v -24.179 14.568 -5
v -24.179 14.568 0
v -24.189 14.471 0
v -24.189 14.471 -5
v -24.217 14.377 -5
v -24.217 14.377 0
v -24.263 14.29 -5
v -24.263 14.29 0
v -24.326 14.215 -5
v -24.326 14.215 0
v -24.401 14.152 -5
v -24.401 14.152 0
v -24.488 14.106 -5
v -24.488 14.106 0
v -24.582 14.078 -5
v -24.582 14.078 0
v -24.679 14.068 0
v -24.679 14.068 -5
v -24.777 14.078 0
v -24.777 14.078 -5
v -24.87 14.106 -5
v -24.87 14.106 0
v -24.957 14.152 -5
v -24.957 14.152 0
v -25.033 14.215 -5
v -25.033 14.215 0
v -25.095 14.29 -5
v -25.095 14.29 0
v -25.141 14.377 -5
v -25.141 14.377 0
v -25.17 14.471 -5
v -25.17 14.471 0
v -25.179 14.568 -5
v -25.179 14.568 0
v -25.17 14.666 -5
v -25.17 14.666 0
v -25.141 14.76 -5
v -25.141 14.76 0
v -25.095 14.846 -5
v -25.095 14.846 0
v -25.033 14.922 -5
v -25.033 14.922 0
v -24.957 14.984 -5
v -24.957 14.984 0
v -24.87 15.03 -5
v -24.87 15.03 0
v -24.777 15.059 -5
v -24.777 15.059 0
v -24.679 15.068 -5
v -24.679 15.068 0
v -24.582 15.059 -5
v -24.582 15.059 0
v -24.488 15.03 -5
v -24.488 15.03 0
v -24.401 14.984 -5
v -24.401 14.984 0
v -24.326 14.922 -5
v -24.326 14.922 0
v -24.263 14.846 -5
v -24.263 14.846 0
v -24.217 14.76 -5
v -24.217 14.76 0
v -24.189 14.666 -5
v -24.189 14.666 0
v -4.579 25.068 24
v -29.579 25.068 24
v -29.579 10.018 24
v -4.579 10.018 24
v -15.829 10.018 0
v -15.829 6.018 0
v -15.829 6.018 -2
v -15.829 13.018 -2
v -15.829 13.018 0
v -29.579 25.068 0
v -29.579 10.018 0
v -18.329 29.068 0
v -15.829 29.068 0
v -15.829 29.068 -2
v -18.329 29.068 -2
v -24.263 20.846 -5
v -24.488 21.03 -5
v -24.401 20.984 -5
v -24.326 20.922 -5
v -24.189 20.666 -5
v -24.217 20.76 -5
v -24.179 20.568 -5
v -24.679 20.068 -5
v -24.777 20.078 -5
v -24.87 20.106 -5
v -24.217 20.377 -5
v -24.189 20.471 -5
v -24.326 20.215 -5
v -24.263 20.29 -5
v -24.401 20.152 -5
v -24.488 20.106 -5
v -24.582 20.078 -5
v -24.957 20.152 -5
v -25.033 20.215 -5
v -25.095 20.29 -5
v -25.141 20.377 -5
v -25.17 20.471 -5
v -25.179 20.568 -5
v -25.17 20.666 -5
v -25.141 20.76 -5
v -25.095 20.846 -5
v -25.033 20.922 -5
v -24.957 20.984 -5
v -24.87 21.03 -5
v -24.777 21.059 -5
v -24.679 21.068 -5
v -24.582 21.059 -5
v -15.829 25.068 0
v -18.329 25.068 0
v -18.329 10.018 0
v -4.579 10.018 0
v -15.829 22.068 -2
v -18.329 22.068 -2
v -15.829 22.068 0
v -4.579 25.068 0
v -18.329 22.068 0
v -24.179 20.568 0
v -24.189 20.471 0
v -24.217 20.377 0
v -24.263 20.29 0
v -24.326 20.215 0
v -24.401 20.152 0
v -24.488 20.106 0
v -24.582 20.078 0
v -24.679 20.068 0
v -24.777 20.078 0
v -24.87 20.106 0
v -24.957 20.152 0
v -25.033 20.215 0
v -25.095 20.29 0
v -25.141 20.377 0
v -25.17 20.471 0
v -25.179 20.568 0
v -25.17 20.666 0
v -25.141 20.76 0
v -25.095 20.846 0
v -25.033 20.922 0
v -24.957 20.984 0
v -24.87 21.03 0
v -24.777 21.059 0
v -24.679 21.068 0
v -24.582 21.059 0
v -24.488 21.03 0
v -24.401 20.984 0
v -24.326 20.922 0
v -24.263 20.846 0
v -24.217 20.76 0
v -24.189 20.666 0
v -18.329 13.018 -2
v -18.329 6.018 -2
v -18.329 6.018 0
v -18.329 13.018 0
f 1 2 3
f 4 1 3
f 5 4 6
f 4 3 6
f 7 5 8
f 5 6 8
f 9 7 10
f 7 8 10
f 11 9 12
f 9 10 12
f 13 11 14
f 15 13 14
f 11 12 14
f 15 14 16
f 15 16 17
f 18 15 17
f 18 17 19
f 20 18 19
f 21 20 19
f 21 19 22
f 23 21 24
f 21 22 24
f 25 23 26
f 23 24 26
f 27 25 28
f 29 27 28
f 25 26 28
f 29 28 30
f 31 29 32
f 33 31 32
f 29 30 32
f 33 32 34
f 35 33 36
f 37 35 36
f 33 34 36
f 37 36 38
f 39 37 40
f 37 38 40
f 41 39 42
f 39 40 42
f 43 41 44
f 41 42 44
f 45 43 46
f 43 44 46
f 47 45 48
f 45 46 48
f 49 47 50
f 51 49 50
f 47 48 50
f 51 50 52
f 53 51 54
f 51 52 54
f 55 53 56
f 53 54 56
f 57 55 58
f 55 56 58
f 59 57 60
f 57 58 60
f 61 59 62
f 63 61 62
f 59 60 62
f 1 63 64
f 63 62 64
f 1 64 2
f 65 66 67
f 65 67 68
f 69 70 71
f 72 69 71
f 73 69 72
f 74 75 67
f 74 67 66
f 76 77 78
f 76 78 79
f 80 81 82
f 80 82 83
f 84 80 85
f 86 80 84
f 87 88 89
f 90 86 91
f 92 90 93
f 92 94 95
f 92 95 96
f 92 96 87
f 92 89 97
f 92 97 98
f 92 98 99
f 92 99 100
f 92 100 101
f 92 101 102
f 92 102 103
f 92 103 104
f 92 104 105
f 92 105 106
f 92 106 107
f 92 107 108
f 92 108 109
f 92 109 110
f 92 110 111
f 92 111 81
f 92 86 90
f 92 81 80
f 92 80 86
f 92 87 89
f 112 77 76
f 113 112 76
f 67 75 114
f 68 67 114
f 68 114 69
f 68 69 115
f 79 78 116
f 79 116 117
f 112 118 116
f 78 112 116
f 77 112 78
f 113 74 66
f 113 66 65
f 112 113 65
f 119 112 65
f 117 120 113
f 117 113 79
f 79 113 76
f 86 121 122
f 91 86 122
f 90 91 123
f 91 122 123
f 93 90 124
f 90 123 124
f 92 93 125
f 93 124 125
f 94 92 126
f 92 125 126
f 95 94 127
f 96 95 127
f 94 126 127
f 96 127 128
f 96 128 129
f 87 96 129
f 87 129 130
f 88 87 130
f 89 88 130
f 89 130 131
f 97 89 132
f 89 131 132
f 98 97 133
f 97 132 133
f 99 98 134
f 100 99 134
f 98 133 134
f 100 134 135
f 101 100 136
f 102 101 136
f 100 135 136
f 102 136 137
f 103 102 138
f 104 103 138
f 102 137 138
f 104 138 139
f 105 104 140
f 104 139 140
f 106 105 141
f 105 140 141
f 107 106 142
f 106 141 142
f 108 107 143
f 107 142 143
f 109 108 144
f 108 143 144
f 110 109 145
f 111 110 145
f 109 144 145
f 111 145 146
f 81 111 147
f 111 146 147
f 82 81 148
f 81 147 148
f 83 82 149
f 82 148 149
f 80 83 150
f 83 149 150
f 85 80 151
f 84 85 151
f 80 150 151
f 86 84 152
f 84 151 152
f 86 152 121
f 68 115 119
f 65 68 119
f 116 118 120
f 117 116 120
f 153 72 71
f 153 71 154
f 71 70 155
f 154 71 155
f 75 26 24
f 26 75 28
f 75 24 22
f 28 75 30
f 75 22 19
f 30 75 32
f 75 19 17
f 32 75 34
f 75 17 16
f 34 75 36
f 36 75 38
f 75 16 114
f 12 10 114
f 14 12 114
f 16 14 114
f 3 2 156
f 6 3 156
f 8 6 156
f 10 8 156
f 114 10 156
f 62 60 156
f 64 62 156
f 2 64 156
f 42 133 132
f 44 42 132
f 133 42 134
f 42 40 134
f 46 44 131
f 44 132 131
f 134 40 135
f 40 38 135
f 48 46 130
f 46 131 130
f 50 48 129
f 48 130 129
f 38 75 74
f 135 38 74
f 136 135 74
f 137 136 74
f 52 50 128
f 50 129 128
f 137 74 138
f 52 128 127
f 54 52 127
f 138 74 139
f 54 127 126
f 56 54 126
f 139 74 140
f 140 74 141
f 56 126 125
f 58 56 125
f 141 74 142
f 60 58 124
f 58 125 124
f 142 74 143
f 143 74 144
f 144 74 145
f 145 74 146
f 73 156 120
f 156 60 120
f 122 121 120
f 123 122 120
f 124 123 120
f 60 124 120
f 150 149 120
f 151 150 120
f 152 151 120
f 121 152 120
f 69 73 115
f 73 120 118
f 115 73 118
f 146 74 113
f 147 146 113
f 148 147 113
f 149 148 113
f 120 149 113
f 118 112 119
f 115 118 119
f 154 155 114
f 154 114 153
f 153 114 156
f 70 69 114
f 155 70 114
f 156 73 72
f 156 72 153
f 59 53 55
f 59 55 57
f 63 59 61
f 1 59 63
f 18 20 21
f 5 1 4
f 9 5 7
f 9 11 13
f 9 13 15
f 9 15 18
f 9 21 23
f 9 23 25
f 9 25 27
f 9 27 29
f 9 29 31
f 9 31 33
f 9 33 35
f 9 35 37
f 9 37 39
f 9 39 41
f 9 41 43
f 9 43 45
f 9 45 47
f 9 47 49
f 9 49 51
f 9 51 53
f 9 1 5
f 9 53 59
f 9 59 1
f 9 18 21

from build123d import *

# Parameters (mm, degrees)
SKETCH_2_W      = 25.0000008
SKETCH_2_H      = 15.04999784
EXTRUDE_2_DEPTH = 24
SKETCH_3_R      = 0.5
EXTRUDE_3_DEPTH = 5
SKETCH_4_W      = 2.5
SKETCH_4_H      = 7
EXTRUDE_4_DEPTH = 2


with BuildPart() as part:
    # Эскиз2 → Бобышка-Вытянуть2 (new body)
    with BuildSketch(Plane.XY):
        with Locations((-17.07912528, 17.543231945)):
            Rectangle(SKETCH_2_W, SKETCH_2_H)
    extrude(amount=EXTRUDE_2_DEPTH)

    # Эскиз3 → Бобышка-Вытянуть3 (add)
    with BuildSketch(Plane(origin=(0, 0, 0), x_dir=(-1, 0, 0), z_dir=(0, 0, -1))):
        with Locations(Location((24.67912568, 20.568230865, 0), (0, 0, 180))):
            Circle(SKETCH_3_R)
        with Locations(Location((24.67912568, 14.568230865, 0), (0, 0, 180))):
            Circle(SKETCH_3_R)
    extrude(amount=EXTRUDE_3_DEPTH)

    # Эскиз4 → Бобышка-Вытянуть4 (add)
    with BuildSketch(Plane(origin=(0, 0, 0), x_dir=(-1, 0, 0), z_dir=(0, 0, -1))):
        with Locations((17.07912488, 25.568230865)):
            Rectangle(SKETCH_4_W, SKETCH_4_H)
        with Locations((17.07912488, 9.518233025)):
            Rectangle(SKETCH_4_W, SKETCH_4_H)
    extrude(amount=EXTRUDE_4_DEPTH)


solid = part.part
